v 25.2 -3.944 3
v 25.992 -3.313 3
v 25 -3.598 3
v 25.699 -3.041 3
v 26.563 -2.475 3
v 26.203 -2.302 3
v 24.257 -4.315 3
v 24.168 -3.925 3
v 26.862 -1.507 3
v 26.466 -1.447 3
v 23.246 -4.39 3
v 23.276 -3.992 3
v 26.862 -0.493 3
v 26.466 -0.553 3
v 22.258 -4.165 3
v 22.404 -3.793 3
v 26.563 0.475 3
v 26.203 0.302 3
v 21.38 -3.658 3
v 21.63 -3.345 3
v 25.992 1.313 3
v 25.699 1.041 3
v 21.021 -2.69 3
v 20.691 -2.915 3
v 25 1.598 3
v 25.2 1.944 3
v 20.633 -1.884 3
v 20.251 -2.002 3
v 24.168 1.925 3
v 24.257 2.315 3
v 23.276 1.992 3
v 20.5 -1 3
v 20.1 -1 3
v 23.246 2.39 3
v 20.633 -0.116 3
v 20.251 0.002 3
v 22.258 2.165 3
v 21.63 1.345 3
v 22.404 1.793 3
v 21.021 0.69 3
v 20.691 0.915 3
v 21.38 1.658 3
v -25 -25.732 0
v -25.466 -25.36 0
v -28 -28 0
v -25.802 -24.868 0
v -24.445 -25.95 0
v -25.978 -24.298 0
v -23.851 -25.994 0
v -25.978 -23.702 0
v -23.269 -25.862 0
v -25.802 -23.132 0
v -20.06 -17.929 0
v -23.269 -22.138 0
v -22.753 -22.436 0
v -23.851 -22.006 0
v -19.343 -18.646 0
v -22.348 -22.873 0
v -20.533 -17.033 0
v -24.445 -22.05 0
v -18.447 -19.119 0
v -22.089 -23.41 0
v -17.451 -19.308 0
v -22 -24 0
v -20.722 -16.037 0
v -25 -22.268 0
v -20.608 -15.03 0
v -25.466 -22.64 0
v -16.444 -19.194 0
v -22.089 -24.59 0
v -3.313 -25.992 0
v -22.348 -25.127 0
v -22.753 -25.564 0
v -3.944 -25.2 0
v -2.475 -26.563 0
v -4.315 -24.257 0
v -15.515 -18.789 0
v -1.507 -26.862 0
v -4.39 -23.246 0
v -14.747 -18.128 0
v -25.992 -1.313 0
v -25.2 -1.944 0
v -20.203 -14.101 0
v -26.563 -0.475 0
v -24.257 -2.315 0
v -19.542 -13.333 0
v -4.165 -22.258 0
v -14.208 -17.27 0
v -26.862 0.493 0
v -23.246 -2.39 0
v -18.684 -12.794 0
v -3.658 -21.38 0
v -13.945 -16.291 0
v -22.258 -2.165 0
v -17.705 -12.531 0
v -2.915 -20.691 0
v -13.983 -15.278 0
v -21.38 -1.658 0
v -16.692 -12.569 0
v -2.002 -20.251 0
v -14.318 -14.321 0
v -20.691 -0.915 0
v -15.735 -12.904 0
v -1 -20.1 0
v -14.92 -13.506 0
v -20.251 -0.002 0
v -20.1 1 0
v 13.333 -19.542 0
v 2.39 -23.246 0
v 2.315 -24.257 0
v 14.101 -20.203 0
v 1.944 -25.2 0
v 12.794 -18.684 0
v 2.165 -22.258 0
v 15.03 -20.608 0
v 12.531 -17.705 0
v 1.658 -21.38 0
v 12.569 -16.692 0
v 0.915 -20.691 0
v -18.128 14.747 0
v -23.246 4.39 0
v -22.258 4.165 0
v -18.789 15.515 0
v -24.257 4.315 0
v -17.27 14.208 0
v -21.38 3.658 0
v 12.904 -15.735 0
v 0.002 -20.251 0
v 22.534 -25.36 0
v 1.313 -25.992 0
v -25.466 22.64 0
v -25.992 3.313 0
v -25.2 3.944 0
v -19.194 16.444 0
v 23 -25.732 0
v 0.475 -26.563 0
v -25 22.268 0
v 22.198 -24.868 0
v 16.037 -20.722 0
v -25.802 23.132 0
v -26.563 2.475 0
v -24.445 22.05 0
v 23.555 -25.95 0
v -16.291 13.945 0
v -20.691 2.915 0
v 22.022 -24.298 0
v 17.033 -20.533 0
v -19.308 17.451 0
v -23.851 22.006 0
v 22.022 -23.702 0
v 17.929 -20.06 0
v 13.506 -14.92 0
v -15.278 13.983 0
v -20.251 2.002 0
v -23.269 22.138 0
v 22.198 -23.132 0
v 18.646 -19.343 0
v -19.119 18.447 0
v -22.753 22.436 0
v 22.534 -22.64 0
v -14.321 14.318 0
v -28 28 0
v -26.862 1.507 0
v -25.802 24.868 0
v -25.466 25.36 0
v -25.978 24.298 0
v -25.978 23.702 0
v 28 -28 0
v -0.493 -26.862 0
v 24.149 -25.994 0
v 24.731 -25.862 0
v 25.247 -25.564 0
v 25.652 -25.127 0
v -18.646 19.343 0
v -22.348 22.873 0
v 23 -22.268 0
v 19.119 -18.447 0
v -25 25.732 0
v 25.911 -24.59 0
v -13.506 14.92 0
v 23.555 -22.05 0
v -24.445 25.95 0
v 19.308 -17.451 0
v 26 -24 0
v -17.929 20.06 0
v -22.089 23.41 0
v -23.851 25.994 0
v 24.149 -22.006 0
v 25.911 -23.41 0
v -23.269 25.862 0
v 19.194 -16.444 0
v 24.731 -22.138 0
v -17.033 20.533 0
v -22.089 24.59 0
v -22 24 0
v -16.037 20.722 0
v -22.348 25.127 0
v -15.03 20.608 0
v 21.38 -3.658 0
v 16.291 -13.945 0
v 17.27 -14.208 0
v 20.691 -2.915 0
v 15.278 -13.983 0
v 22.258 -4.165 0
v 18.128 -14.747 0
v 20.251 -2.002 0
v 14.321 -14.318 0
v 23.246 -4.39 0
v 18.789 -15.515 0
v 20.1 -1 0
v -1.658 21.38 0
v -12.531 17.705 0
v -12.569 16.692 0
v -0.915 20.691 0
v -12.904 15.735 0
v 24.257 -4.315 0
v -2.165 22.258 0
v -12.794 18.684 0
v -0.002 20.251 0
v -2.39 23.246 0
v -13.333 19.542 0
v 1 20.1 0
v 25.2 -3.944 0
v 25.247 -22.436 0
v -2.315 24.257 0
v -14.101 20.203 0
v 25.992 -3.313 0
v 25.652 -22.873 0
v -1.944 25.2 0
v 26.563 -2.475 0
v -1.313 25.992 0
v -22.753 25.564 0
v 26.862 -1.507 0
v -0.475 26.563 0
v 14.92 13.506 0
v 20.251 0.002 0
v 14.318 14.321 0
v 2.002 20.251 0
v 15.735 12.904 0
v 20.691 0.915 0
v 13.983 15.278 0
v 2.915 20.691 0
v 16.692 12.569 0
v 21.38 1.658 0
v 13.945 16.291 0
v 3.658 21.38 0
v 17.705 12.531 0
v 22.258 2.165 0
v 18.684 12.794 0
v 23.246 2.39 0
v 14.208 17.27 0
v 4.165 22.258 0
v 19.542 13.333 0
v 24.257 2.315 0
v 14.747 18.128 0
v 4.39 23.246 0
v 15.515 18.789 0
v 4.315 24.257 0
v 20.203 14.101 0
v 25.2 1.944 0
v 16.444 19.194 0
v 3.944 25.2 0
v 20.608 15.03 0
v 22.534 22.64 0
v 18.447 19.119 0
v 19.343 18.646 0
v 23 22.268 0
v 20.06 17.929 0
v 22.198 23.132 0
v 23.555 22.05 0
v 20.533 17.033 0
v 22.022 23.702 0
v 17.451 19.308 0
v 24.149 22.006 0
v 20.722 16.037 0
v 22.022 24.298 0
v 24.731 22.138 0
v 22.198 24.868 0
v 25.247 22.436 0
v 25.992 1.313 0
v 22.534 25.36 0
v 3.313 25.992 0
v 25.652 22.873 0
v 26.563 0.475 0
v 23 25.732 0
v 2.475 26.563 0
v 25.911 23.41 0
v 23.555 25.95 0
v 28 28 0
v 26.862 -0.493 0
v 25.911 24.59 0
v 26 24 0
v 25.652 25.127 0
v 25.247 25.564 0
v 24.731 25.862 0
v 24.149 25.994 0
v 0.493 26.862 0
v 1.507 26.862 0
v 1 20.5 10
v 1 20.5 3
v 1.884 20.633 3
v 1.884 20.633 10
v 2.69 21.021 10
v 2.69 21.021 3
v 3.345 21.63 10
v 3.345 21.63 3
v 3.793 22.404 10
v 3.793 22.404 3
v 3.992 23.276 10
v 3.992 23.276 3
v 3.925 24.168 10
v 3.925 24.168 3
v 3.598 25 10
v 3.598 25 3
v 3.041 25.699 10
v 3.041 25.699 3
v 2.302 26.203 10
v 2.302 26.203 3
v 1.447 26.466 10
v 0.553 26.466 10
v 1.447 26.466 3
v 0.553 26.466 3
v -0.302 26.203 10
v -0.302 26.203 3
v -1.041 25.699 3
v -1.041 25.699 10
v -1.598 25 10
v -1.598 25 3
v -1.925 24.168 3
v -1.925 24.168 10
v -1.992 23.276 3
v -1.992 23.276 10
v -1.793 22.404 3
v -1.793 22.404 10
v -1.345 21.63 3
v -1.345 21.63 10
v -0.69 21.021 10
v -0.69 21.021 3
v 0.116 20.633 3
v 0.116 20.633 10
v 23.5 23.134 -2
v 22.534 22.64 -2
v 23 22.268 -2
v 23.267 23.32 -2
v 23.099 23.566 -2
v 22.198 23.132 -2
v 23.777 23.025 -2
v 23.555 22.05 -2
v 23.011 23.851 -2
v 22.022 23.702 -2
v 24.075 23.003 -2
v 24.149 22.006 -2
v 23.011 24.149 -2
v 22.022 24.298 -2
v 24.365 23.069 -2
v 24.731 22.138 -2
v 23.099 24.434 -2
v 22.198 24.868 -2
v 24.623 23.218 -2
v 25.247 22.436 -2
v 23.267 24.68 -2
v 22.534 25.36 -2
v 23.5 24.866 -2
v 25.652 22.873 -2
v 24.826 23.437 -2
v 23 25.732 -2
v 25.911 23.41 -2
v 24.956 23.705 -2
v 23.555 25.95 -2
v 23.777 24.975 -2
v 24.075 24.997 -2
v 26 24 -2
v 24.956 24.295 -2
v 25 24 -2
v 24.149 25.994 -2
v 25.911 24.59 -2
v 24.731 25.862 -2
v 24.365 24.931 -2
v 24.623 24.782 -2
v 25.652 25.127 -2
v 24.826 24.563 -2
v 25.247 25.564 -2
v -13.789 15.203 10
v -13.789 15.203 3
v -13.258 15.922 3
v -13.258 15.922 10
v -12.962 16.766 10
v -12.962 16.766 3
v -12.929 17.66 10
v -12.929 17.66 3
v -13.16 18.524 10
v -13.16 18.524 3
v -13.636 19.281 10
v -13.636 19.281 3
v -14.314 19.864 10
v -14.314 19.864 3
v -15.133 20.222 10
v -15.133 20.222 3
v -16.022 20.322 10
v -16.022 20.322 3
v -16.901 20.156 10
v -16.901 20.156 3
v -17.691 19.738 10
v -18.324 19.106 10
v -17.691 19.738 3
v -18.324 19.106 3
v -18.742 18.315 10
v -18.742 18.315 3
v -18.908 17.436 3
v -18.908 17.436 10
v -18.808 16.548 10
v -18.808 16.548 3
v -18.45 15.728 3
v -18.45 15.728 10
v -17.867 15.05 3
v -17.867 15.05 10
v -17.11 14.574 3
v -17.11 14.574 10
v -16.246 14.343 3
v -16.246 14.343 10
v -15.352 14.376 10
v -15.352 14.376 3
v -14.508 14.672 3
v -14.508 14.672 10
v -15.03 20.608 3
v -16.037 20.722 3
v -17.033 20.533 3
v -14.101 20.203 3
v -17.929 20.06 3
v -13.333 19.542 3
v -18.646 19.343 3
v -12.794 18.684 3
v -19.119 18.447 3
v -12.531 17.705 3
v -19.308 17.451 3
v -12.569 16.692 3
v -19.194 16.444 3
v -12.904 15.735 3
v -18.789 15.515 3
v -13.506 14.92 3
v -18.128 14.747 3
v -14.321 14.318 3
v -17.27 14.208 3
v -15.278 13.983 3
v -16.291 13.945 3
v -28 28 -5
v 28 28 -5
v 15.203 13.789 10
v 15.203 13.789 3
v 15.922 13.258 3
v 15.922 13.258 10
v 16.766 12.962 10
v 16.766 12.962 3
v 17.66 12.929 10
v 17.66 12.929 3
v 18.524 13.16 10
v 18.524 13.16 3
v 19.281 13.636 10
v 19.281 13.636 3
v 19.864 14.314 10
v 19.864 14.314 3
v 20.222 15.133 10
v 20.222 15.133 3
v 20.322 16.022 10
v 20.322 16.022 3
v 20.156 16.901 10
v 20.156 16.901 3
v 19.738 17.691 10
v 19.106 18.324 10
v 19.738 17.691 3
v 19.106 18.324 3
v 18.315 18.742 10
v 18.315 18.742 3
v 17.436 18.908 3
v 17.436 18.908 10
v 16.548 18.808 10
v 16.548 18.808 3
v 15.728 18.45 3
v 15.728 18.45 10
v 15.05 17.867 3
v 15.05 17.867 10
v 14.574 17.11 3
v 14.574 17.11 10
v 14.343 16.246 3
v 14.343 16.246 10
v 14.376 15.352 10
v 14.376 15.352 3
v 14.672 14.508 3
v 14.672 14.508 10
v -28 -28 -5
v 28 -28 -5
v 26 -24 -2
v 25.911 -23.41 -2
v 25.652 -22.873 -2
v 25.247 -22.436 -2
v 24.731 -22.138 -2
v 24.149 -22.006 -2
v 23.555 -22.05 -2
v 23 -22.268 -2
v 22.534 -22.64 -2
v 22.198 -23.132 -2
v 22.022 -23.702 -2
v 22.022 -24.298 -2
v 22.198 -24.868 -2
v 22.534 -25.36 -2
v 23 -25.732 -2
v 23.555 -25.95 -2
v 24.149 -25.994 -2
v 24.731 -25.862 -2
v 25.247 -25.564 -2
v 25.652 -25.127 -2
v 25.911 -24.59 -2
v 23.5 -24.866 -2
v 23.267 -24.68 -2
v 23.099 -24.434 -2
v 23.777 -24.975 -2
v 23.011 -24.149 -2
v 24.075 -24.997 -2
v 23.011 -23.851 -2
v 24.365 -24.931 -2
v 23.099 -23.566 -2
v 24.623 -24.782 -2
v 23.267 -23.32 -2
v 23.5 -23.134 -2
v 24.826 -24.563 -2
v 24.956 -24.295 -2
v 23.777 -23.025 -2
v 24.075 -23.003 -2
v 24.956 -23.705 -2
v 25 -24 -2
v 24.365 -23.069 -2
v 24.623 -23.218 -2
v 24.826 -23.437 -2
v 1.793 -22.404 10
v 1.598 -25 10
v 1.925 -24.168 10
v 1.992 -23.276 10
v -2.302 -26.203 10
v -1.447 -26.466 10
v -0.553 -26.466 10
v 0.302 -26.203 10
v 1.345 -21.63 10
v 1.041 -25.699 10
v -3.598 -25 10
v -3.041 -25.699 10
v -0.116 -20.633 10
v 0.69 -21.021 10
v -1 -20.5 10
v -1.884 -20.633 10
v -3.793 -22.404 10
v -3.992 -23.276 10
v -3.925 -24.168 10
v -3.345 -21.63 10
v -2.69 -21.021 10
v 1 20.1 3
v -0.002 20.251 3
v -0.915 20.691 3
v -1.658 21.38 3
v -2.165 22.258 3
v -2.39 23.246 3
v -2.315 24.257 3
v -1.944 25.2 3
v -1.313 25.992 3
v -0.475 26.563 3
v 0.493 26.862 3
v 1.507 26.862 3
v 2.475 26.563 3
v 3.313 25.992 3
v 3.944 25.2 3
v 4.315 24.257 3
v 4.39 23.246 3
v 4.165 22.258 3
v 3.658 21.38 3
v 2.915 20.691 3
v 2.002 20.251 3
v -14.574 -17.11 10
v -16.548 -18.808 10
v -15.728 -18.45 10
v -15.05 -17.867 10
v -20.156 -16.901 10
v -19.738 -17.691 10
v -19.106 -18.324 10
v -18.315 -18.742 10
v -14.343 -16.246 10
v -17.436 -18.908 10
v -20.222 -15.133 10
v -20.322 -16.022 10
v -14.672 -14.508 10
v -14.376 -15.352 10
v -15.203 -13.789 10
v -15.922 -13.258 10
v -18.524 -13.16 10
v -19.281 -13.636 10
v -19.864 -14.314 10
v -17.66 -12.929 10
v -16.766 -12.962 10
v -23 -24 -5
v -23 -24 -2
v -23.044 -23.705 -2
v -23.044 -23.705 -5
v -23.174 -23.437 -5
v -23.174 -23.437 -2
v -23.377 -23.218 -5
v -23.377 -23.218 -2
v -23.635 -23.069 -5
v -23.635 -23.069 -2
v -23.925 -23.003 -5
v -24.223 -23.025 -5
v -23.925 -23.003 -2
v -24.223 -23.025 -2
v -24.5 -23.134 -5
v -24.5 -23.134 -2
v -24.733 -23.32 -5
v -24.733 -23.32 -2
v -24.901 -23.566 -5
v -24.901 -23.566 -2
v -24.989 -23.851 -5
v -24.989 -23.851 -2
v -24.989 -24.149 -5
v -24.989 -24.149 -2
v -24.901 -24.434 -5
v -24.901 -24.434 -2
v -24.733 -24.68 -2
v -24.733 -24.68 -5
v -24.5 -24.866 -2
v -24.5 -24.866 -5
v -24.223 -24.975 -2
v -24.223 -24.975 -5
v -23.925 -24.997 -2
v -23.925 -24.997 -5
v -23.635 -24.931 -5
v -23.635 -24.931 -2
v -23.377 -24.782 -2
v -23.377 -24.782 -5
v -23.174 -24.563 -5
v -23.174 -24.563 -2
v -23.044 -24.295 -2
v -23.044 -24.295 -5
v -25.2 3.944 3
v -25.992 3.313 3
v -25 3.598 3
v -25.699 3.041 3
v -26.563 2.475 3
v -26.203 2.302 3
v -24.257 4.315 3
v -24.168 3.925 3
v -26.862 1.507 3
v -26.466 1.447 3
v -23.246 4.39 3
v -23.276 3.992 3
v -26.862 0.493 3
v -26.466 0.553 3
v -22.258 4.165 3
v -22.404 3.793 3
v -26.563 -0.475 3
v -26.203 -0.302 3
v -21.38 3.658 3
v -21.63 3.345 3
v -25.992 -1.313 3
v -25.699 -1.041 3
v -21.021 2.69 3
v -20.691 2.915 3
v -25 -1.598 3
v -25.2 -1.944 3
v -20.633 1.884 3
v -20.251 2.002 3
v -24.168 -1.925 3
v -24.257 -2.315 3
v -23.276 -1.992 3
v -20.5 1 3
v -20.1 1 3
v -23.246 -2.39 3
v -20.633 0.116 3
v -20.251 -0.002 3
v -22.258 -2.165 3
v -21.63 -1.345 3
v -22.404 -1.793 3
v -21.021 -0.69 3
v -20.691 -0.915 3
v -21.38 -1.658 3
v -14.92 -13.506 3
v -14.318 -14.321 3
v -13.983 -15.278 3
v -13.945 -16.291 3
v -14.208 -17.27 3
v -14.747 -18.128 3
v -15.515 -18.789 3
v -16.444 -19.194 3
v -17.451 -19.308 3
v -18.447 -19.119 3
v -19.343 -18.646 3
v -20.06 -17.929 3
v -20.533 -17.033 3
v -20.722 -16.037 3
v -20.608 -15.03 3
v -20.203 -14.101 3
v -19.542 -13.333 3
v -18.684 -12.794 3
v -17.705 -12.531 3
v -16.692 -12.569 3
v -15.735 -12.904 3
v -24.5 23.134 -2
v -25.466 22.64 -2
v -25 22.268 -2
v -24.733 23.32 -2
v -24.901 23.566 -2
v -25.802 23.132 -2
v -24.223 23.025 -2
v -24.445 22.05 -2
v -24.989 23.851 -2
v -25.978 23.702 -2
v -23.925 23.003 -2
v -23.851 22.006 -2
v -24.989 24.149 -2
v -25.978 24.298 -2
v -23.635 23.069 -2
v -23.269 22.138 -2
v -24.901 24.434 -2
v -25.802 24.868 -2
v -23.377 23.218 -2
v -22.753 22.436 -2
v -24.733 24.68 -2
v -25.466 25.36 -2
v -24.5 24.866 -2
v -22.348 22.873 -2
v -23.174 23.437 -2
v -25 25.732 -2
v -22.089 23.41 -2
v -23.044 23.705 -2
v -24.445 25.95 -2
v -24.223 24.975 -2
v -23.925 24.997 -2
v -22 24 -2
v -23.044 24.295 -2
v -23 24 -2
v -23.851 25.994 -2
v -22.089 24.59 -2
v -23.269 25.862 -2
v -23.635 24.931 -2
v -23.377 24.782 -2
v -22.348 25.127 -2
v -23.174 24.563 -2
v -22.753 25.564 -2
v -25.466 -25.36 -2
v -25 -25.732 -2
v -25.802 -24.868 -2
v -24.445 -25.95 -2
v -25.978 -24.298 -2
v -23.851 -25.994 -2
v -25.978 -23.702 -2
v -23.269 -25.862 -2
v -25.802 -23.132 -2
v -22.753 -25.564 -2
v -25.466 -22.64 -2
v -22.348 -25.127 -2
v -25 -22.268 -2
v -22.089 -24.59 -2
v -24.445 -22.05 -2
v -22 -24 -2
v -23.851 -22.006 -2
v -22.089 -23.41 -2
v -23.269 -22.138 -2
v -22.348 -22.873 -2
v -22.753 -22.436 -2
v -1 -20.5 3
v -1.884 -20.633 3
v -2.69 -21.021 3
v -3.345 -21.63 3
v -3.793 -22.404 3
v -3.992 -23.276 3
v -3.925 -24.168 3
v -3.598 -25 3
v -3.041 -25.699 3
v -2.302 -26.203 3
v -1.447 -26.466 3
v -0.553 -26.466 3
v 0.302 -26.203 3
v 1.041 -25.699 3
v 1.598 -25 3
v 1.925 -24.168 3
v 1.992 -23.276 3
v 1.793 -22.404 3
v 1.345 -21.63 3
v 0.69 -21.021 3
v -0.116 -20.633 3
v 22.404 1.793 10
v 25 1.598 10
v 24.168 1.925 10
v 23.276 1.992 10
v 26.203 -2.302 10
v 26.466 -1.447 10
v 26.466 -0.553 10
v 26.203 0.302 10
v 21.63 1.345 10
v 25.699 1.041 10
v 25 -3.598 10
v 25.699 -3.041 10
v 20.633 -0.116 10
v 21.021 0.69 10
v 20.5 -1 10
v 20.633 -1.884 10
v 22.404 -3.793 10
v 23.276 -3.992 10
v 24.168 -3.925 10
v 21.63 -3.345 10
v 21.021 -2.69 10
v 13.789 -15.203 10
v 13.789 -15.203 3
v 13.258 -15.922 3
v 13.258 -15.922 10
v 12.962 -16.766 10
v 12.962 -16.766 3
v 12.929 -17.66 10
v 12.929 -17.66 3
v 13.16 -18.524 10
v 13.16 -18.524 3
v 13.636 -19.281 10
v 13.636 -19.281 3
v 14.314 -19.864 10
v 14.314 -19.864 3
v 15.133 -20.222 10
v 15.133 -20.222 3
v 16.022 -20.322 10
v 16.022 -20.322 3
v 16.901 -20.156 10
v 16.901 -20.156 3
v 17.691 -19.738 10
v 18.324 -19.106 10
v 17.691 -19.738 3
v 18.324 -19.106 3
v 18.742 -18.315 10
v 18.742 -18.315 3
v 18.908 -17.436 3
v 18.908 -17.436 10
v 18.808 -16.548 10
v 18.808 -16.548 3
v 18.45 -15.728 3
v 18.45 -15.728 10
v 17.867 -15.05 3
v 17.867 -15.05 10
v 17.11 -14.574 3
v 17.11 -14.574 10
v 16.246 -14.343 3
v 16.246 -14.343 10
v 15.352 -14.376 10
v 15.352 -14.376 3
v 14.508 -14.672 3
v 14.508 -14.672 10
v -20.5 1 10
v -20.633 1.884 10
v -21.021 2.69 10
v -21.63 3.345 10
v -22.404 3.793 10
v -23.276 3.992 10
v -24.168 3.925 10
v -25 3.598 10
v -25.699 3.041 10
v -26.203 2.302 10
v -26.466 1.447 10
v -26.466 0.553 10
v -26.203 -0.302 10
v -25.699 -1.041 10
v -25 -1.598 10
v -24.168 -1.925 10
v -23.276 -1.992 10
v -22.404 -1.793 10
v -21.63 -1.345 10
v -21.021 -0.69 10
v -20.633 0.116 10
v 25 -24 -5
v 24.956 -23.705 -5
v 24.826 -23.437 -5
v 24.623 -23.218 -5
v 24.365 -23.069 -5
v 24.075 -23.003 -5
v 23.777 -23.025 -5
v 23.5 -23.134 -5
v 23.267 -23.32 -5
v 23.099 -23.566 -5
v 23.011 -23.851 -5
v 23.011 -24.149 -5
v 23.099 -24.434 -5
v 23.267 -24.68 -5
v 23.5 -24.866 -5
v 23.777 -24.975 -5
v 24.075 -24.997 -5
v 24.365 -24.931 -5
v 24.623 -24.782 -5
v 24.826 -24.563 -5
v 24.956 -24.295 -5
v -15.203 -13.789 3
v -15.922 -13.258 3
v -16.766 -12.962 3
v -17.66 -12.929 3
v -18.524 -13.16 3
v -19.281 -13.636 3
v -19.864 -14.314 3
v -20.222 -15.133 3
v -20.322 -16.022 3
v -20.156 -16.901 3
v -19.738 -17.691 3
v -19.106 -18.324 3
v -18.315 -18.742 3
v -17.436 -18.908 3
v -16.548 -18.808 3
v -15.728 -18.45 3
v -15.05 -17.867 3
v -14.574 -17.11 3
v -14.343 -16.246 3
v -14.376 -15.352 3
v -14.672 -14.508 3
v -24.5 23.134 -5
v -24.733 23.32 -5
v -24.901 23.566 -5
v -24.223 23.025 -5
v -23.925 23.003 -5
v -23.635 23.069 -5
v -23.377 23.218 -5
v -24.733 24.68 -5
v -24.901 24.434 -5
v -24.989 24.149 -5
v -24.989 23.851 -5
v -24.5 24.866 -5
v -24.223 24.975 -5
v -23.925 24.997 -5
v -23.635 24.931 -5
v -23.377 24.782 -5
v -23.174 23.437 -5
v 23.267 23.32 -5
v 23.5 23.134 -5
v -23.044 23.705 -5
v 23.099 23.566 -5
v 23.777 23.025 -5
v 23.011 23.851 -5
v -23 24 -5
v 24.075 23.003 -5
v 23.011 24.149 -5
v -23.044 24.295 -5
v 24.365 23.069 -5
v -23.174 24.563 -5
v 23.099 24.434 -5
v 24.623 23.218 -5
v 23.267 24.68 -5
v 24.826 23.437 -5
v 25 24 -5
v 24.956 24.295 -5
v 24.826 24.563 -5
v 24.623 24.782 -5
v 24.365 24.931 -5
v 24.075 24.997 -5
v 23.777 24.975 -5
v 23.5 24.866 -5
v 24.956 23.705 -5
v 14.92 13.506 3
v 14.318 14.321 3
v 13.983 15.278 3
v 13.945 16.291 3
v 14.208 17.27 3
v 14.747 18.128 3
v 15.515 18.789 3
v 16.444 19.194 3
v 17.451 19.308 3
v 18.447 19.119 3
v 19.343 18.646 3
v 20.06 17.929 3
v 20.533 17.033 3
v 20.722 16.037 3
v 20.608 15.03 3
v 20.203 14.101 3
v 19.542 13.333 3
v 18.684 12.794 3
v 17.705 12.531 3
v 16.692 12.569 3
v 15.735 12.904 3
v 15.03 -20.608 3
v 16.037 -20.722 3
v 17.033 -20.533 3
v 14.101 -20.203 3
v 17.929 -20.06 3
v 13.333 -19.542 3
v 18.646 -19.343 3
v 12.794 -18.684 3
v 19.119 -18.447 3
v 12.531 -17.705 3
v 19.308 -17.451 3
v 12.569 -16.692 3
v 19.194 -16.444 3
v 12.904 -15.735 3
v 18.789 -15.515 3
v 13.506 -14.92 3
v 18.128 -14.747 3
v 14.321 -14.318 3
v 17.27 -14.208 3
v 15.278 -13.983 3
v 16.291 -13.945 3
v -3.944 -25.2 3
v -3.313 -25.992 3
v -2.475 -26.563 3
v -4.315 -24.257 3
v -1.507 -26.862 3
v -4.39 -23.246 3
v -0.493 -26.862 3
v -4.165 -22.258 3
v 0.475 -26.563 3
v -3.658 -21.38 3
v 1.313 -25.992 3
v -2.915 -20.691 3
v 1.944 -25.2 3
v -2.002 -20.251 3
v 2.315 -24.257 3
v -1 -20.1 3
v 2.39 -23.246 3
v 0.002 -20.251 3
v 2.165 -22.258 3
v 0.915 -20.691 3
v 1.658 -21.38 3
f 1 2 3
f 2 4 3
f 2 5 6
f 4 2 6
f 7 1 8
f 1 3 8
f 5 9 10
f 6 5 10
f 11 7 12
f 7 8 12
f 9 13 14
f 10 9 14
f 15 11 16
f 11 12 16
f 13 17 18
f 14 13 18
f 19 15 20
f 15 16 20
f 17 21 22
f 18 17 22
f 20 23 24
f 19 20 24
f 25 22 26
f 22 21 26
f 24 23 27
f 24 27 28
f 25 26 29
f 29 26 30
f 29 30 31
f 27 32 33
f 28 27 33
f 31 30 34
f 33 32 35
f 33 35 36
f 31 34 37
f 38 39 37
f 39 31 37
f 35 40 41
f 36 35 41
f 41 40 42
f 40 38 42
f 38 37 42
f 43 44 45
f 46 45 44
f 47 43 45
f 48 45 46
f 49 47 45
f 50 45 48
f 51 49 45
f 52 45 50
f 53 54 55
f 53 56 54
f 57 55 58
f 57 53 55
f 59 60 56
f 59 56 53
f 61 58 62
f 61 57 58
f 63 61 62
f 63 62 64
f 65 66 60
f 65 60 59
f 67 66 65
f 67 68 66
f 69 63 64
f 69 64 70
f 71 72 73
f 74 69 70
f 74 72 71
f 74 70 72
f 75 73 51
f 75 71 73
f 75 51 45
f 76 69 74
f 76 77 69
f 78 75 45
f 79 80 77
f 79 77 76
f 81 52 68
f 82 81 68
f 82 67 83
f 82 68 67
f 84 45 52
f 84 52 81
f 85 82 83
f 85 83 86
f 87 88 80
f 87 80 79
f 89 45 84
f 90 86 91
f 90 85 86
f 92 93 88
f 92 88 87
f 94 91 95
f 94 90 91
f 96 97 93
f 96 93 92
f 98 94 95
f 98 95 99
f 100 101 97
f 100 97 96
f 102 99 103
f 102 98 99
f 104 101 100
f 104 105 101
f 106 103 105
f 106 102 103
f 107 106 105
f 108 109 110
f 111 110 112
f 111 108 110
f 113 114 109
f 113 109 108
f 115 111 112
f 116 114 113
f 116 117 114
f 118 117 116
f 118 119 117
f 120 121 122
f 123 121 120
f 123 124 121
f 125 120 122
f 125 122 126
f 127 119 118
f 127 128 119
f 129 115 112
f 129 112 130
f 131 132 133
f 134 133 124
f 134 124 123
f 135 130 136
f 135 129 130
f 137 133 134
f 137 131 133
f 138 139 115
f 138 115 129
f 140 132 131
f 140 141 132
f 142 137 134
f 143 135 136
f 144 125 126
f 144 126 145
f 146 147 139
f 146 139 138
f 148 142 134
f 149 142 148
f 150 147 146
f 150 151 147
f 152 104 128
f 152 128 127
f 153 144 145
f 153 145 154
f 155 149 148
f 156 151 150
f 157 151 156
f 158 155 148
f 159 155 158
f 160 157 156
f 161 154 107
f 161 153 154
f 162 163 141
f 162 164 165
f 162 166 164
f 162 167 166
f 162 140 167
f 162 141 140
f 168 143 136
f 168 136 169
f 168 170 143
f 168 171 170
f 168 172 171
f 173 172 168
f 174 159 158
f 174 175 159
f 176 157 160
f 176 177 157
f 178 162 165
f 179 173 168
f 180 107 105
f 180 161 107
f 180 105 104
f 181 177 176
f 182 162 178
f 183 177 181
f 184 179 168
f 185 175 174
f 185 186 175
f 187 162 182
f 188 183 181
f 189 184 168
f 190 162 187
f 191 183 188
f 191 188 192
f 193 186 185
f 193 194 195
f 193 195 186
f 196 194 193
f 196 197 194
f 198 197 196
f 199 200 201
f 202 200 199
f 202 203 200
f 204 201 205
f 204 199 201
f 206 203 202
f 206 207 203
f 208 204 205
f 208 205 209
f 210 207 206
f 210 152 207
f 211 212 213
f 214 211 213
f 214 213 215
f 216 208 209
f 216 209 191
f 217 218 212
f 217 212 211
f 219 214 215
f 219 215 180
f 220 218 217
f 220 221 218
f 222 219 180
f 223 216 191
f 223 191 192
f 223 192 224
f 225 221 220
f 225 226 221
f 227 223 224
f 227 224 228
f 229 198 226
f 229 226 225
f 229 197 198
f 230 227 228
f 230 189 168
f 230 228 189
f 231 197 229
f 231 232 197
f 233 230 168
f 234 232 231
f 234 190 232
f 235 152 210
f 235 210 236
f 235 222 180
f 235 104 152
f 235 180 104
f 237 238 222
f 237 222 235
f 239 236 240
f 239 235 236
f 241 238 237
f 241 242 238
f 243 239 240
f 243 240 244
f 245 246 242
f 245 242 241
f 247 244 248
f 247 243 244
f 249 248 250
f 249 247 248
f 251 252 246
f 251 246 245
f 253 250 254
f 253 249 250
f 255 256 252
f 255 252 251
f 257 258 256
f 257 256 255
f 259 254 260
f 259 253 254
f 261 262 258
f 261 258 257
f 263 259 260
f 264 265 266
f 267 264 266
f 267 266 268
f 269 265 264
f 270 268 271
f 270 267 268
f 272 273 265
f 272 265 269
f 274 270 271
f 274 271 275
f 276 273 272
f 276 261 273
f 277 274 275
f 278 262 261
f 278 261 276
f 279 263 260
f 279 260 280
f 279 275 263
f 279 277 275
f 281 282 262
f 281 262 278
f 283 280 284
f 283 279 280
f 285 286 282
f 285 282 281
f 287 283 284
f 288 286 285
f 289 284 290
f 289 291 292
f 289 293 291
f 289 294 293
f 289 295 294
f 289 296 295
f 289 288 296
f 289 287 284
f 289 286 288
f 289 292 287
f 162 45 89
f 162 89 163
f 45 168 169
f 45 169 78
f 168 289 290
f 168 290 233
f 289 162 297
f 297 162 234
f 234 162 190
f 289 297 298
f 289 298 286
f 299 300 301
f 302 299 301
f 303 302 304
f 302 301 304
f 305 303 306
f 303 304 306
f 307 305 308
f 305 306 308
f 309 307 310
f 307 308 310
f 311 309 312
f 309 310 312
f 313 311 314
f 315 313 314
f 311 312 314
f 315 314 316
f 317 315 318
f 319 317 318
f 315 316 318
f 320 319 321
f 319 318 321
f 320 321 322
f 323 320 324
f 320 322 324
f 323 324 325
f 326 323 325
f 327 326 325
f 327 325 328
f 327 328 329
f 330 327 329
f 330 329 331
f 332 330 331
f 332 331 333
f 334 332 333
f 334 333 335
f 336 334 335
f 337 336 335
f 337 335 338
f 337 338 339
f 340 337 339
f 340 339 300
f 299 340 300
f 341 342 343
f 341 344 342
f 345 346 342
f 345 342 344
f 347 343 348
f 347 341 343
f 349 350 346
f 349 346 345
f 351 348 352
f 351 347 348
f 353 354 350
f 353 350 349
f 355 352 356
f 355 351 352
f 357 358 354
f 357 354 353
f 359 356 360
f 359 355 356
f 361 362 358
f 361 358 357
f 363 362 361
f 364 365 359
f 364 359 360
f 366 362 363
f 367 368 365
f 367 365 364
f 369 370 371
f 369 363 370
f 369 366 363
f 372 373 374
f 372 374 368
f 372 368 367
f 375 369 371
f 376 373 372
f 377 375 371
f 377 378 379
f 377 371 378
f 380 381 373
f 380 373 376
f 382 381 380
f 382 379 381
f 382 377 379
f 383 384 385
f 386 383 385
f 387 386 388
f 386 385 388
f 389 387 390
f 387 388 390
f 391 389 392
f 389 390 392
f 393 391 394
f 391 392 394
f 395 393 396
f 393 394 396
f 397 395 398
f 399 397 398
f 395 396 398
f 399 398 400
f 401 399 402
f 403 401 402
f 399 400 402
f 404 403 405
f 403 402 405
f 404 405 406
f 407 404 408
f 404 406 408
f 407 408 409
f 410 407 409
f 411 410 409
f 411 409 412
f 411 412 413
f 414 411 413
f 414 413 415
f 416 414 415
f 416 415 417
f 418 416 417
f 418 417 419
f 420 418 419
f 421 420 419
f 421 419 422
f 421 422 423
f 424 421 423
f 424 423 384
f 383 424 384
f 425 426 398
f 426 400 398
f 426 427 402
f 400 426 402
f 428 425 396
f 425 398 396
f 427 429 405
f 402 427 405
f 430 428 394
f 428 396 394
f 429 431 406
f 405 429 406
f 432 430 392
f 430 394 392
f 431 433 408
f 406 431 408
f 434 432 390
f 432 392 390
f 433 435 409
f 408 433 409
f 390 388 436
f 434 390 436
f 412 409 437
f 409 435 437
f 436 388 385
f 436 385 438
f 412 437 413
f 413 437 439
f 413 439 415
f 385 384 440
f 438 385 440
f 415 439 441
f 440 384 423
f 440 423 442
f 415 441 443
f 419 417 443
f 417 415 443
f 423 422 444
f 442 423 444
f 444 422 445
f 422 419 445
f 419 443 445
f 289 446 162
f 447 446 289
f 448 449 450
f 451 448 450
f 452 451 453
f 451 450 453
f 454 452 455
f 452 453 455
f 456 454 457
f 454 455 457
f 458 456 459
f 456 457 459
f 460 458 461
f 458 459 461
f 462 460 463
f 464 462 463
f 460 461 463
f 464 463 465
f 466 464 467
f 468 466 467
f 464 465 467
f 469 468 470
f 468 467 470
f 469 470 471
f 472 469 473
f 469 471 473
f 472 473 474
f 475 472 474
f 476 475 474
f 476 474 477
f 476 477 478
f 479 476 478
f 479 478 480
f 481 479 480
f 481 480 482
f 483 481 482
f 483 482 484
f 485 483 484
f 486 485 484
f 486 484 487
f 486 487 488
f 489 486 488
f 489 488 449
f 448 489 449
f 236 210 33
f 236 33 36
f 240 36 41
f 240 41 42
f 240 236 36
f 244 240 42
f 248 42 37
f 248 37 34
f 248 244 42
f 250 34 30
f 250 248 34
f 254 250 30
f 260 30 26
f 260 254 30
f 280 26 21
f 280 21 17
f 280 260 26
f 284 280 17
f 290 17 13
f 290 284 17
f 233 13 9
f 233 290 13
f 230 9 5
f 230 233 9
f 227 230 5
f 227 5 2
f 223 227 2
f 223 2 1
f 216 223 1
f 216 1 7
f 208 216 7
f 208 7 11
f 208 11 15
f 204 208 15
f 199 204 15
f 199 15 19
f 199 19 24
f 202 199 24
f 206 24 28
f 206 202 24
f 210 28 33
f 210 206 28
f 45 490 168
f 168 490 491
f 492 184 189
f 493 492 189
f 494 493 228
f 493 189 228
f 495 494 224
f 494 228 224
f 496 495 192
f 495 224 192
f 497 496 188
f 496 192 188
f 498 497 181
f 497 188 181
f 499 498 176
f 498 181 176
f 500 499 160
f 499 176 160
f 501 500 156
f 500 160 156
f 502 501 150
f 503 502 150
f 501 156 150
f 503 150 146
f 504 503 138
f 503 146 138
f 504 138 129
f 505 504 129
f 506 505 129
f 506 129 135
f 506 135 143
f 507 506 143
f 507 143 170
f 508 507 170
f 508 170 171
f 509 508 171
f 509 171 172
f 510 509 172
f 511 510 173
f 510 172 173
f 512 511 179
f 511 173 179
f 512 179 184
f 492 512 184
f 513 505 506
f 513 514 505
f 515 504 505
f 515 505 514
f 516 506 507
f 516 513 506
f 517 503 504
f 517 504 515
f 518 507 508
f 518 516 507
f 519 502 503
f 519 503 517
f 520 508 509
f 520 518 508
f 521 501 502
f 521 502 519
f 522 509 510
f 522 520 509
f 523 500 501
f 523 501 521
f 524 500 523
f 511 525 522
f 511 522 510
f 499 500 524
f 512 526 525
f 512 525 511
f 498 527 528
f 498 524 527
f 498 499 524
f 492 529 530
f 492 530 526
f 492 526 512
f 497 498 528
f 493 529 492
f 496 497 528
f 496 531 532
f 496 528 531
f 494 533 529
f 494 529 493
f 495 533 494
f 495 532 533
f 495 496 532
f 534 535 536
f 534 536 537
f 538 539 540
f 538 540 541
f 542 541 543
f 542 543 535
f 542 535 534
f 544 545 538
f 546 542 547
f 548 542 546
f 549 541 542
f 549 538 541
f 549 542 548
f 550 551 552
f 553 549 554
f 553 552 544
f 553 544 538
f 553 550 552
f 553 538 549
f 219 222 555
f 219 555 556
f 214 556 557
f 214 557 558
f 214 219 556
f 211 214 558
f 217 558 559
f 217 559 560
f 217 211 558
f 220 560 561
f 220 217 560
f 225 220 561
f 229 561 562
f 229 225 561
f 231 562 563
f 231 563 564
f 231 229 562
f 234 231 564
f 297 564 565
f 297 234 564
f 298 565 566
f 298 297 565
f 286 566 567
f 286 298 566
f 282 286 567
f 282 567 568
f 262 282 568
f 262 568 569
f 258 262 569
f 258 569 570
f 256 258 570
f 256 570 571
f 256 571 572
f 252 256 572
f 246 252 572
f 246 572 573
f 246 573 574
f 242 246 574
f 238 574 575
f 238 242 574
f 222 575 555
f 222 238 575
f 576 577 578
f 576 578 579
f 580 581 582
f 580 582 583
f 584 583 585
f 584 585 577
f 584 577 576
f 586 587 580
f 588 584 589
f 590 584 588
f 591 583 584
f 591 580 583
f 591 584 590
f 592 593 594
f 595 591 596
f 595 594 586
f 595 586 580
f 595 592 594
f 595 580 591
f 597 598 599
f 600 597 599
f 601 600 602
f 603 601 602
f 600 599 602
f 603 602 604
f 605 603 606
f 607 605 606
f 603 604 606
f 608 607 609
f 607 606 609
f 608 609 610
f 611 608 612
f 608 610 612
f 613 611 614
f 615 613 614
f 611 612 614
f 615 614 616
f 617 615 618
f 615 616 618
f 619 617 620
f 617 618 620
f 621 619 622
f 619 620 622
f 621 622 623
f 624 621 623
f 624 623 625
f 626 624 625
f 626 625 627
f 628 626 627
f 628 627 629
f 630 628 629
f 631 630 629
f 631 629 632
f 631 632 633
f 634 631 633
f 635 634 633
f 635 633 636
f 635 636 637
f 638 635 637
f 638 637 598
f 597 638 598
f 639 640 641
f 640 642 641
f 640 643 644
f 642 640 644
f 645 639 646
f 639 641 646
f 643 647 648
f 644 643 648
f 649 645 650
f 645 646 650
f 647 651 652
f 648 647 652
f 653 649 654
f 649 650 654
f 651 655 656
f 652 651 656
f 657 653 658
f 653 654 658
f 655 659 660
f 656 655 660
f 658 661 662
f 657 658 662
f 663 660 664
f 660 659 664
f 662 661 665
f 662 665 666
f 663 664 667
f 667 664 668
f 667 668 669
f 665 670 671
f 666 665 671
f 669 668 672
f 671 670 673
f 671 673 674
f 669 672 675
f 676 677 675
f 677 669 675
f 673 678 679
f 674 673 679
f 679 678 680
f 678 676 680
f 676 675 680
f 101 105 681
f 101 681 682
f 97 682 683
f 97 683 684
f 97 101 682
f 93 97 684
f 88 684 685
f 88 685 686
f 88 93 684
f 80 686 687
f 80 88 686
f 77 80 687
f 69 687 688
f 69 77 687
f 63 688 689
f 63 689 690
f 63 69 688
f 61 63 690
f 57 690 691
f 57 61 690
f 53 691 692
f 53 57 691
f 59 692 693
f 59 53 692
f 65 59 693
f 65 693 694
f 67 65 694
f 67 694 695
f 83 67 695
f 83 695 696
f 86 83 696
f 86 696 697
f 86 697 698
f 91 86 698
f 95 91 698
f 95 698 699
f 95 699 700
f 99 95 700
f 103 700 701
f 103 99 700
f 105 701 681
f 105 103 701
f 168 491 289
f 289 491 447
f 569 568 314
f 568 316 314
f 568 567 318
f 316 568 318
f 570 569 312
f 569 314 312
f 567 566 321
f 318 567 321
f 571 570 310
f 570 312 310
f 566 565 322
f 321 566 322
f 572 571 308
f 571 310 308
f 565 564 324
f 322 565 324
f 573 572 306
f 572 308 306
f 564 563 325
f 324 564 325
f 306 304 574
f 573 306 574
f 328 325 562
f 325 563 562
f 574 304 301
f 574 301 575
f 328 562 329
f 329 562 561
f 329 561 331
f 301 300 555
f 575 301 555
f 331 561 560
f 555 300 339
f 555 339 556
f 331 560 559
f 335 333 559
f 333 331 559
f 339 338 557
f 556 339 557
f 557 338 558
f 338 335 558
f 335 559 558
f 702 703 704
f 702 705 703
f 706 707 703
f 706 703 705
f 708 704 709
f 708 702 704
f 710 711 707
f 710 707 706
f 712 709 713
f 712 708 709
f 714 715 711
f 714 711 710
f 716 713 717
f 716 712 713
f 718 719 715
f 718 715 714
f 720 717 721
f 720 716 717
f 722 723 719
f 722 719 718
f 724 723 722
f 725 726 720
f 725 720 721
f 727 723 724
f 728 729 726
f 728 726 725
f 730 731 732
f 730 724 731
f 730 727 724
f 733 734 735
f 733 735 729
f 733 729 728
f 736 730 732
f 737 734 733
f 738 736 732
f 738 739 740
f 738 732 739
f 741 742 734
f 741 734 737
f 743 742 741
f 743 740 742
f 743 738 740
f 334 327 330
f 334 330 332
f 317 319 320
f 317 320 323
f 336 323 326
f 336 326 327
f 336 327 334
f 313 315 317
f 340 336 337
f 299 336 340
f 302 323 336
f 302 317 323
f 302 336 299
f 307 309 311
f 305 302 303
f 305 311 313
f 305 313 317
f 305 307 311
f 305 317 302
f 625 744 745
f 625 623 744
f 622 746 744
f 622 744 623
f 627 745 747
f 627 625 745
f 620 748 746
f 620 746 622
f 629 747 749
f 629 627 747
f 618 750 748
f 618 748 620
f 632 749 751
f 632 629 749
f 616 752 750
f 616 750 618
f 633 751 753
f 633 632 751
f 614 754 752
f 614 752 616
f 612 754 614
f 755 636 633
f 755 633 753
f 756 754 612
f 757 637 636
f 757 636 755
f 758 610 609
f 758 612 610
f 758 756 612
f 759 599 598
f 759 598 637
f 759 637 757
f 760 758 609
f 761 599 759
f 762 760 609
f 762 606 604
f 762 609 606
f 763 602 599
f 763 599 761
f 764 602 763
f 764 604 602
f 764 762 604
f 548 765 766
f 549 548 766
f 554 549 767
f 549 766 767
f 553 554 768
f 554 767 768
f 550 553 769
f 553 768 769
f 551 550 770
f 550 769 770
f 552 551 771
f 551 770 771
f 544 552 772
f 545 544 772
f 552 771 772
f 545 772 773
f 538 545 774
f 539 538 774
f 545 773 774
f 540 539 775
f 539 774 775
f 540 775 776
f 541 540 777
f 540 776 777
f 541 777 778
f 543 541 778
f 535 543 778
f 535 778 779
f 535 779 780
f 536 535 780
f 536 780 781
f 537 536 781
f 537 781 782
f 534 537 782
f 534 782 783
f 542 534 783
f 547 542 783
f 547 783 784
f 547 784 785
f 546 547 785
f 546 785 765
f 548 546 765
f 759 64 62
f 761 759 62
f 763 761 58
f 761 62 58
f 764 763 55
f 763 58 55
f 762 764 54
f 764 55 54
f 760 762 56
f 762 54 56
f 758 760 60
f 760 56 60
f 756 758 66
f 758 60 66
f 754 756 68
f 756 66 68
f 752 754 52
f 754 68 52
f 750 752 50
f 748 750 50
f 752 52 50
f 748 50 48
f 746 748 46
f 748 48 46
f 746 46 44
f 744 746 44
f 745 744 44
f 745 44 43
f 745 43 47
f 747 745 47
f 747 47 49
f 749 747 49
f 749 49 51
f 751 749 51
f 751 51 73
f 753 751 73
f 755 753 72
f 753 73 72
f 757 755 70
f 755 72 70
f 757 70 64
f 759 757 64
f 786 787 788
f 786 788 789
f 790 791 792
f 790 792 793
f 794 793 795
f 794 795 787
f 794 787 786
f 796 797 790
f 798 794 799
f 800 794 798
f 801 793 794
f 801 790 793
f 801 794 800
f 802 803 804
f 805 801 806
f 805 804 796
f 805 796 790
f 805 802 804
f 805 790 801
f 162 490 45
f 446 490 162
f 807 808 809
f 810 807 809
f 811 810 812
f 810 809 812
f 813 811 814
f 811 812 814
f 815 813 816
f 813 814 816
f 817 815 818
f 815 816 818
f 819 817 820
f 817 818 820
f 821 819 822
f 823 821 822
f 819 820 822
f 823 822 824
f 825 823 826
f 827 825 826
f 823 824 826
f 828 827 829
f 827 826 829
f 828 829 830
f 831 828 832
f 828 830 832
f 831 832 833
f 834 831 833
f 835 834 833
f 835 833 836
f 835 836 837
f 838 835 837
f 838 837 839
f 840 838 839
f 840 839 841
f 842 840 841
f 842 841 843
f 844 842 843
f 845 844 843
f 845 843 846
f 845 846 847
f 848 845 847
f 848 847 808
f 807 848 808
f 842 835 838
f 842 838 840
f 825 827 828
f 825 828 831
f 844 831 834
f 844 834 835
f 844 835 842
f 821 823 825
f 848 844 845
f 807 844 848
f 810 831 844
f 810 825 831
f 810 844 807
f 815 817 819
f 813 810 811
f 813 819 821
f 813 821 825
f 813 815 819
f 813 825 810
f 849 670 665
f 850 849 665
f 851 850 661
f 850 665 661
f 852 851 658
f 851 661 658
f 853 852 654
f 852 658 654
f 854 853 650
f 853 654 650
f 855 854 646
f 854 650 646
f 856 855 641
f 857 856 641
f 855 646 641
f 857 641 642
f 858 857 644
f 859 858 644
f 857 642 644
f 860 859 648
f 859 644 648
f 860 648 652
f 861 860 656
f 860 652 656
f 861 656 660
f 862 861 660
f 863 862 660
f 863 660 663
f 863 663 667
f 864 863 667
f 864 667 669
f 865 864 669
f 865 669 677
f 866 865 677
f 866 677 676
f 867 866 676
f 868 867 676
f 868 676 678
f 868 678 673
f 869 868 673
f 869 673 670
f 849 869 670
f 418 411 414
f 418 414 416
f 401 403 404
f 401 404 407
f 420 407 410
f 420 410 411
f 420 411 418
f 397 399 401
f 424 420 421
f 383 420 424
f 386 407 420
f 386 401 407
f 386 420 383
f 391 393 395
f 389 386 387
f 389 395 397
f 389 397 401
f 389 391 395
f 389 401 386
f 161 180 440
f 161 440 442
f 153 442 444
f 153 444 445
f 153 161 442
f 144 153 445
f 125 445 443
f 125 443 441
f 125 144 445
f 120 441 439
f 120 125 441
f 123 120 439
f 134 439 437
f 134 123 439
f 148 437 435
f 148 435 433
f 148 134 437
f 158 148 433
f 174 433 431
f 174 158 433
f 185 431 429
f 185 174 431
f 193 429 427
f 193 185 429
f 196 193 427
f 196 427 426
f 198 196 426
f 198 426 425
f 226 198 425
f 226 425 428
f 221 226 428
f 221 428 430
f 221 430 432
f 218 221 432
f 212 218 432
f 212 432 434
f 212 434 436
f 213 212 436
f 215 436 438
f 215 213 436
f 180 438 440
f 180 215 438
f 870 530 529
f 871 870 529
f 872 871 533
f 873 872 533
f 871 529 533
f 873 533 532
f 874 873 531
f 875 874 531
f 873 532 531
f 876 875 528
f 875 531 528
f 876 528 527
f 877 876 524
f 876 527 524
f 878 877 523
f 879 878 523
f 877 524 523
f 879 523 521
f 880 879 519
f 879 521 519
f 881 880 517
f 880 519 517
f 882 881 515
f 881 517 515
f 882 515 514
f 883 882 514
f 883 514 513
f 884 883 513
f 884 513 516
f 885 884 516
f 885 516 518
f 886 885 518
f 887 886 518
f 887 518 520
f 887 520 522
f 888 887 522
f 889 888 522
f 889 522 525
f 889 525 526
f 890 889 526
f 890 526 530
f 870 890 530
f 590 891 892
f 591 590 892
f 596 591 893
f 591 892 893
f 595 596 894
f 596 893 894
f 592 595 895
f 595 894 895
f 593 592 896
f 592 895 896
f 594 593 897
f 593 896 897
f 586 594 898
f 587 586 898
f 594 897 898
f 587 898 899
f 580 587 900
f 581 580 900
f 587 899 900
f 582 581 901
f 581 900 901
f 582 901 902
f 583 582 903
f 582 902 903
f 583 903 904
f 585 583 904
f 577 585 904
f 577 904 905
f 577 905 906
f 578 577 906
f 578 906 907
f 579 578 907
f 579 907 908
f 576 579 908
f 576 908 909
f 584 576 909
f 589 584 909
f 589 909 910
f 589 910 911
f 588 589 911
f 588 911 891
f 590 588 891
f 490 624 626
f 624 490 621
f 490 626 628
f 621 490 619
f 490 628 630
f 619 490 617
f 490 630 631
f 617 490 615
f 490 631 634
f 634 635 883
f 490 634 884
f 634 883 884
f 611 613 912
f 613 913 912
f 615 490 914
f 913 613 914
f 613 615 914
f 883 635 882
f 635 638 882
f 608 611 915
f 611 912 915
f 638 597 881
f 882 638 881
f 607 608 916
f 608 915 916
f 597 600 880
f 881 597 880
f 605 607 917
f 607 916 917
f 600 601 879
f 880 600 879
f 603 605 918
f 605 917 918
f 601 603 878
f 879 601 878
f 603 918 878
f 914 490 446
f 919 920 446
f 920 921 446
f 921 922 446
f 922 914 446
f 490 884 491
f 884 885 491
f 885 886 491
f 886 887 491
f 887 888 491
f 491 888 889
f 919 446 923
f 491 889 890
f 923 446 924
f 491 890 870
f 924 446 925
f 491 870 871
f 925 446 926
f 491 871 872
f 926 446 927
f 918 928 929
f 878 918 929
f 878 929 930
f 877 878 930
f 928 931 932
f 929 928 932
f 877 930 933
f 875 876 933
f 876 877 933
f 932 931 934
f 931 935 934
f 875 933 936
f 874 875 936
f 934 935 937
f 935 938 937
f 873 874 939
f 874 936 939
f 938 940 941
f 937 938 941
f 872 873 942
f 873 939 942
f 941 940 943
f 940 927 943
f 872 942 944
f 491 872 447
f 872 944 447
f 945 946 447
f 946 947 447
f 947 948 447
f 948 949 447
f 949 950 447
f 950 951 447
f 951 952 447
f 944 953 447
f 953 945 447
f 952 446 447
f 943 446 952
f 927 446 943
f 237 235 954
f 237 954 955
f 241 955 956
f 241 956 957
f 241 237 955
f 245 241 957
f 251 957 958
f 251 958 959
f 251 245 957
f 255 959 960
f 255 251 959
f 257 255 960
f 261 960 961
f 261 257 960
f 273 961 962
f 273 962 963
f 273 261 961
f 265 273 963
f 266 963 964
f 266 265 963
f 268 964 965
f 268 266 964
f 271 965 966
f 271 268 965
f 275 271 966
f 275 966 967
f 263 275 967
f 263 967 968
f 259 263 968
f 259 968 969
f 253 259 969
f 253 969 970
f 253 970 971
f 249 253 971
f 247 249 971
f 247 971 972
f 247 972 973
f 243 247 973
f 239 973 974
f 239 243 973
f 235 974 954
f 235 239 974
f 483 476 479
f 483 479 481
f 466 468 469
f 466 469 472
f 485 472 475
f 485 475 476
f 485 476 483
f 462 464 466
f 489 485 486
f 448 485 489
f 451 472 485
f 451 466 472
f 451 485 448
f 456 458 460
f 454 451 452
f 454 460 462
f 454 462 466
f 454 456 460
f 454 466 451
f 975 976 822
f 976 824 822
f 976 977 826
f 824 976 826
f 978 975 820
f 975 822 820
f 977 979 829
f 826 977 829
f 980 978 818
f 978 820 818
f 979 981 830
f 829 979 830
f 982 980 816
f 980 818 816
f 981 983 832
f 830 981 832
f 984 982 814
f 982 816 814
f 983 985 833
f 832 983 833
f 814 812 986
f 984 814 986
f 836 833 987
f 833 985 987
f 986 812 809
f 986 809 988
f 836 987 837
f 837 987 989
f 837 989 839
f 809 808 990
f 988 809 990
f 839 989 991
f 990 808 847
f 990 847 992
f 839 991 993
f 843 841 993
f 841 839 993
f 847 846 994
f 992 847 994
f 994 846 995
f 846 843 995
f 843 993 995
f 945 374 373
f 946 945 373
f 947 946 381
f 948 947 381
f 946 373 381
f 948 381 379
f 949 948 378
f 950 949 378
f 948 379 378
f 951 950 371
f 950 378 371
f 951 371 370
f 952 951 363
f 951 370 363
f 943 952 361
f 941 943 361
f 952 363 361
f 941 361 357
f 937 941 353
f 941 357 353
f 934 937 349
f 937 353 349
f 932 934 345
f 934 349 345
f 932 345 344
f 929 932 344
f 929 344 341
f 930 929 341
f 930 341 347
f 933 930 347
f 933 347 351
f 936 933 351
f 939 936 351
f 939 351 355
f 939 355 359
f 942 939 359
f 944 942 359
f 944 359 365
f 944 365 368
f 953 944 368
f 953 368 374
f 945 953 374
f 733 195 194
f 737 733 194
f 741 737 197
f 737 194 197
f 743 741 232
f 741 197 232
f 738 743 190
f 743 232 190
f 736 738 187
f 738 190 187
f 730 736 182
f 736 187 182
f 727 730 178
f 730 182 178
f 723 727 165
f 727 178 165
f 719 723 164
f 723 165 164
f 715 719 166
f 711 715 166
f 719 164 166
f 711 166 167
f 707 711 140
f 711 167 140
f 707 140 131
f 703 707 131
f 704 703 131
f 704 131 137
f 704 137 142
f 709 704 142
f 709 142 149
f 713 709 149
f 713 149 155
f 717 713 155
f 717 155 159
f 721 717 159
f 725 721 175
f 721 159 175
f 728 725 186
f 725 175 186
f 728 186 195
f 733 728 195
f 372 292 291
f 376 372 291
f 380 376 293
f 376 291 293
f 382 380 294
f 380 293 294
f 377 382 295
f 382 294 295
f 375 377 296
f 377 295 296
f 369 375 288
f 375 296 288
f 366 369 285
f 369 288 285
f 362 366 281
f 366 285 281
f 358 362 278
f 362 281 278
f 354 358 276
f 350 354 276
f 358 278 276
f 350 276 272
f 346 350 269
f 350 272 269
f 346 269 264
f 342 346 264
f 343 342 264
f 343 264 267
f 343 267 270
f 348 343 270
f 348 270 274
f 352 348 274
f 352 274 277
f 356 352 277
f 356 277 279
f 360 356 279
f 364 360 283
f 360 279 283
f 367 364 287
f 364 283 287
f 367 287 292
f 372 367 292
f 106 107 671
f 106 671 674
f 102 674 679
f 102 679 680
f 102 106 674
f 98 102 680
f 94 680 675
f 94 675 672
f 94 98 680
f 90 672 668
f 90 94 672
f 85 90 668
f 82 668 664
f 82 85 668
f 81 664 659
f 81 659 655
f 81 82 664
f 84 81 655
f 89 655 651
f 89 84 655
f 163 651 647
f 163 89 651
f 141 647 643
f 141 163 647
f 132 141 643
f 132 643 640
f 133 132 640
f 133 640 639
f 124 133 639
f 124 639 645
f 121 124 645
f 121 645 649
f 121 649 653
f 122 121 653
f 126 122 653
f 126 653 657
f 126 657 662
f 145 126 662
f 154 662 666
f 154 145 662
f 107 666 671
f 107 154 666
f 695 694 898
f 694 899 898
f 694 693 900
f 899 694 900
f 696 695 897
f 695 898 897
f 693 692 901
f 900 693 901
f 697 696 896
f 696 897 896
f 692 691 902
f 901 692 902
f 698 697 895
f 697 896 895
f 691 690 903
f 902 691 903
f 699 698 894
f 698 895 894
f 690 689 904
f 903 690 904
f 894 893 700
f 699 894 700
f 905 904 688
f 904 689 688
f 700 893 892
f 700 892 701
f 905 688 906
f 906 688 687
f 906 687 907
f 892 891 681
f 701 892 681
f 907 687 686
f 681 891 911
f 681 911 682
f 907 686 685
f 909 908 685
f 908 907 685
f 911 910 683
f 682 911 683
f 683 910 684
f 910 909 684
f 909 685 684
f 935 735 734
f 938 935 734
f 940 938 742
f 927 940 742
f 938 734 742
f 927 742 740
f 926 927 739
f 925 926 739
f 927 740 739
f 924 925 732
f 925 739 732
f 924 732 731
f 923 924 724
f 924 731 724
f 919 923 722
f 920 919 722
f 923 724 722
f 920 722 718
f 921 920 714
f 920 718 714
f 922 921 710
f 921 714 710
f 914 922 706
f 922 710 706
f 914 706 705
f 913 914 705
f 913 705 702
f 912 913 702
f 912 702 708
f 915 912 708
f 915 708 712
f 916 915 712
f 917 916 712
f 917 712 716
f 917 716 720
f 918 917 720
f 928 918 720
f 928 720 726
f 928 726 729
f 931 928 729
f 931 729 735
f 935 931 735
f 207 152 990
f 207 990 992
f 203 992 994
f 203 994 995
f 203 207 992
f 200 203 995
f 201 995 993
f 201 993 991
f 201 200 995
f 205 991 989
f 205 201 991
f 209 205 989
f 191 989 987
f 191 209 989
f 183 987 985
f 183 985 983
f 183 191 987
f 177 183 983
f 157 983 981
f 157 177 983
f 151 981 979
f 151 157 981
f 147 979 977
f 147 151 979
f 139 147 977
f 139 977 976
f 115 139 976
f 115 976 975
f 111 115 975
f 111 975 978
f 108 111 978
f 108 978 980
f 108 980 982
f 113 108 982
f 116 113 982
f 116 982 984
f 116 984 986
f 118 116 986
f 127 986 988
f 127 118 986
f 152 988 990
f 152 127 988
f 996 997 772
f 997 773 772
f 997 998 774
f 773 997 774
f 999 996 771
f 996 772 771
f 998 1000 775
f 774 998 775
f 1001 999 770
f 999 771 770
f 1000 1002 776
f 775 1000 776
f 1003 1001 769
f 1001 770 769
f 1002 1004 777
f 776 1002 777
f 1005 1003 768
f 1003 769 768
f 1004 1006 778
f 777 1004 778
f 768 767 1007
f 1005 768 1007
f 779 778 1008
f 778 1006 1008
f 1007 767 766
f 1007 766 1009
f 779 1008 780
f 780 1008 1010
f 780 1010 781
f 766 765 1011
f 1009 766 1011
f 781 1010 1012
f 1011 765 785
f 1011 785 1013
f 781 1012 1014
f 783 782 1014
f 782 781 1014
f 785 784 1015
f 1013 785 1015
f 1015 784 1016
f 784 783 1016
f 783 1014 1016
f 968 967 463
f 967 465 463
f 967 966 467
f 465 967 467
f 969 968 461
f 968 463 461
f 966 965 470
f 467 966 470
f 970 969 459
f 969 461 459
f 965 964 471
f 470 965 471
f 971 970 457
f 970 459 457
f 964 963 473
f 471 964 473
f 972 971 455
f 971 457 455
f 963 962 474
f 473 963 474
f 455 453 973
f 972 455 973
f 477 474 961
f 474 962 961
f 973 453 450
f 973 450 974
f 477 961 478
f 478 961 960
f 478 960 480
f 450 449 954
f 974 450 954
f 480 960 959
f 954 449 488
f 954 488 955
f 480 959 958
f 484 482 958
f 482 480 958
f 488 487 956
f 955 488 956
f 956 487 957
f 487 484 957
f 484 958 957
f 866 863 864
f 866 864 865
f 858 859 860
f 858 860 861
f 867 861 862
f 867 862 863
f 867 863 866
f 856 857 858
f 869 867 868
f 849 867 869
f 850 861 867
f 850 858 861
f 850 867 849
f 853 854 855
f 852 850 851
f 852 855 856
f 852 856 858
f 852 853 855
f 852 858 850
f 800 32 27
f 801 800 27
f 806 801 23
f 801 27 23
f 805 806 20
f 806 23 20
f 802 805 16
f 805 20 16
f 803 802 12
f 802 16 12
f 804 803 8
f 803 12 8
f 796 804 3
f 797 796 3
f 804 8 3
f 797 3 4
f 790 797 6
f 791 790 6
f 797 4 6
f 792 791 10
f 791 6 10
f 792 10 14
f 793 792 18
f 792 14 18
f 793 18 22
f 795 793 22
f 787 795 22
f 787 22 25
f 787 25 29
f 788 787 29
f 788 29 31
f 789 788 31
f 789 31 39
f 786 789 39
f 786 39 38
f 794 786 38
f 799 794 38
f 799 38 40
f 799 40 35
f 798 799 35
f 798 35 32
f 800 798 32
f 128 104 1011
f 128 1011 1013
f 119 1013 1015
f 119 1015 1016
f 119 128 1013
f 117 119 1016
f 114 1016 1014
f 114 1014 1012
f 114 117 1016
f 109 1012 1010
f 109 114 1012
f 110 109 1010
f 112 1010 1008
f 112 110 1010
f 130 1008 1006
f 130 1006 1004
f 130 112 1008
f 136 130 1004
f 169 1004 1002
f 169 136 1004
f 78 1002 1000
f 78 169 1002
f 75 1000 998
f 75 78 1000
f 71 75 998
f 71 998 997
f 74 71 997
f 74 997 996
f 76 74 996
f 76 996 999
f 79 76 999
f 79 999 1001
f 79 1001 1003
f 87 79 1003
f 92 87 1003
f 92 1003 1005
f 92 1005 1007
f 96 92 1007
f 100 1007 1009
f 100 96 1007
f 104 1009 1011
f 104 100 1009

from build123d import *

# Parameters (mm, degrees)
CYLINDER001_R     = 3
CYLINDER001_DEPTH = 10
SKETCH001_R       = 3.4
PAD_DEPTH         = 3
ARRAY001_COUNT    = 8
BOX001_W          = 56
BOX001_H          = 56
BOX001_DEPTH      = 5
SKETCH002_R       = 2
POCKET001_DEPTH   = 2
SKETCH004_R       = 1
POCKET002_DEPTH   = 5.001
SKETCH005_R       = 1
POCKET003_DEPTH   = 5.001


with BuildPart() as array001:
    # Cylinder001 → Cylinder001 (new body)
    with BuildSketch(Plane(origin=(-23.5, 1, 0), x_dir=(1, 0, 0), z_dir=(0, 0, 1))):
        Circle(CYLINDER001_R)
    extrude(amount=CYLINDER001_DEPTH)

    # Sketch001 → Pad (new body, symmetric)
    with BuildSketch(Plane(origin=(-23.5, 1, 0), x_dir=(1, 0, 0), z_dir=(0, 0, -1))):
        Circle(SKETCH001_R)
    extrude(amount=PAD_DEPTH, both=True)

    # Array001: Array001 ×8 about axis
    array001_axis = Axis((0, 0, 0), (0, 0, 1))


with BuildPart() as array001_1:
    add(array001.part)
    for i in range(1, ARRAY001_COUNT):
        add(array001.part.rotate(array001_axis, i * 360 / ARRAY001_COUNT))


with BuildPart() as pocket003:
    # Box001 → Box001 (new body)
    with BuildSketch(Plane(origin=(-28, -28, -5), x_dir=(1, 0, 0), z_dir=(0, 0, 1))):
        with Locations((28, 28)):
            Rectangle(BOX001_W, BOX001_H)
    extrude(amount=BOX001_DEPTH)

    # Fusion: union Array001
    add(array001_1.part)

    # Sketch002 → Pocket001 (cut)
    with BuildSketch(Plane.XY):
        with Locations((-24, 24)):
            Circle(SKETCH002_R)
        with Locations((24, 24)):
            Circle(SKETCH002_R)
        with Locations((24, -24)):
            Circle(SKETCH002_R)
        with Locations((-24, -24)):
            Circle(SKETCH002_R)
    extrude(amount=-POCKET001_DEPTH, mode=Mode.SUBTRACT)

    # Sketch004 → Pocket002 (cut, through all)
    with BuildSketch(Plane.XY):
        with Locations((-24, 24)):
            Circle(SKETCH004_R)
        with Locations((24, 24)):
            Circle(SKETCH004_R)
        with Locations((-24, -24)):
            Circle(SKETCH004_R)
    extrude(amount=-POCKET002_DEPTH, mode=Mode.SUBTRACT)

    # Sketch005 → Pocket003 (cut, through all)
    with BuildSketch(Plane.XY):
        with Locations((24, -24)):
            Circle(SKETCH005_R)
    extrude(amount=-POCKET003_DEPTH, mode=Mode.SUBTRACT)


solid = pocket003.part
